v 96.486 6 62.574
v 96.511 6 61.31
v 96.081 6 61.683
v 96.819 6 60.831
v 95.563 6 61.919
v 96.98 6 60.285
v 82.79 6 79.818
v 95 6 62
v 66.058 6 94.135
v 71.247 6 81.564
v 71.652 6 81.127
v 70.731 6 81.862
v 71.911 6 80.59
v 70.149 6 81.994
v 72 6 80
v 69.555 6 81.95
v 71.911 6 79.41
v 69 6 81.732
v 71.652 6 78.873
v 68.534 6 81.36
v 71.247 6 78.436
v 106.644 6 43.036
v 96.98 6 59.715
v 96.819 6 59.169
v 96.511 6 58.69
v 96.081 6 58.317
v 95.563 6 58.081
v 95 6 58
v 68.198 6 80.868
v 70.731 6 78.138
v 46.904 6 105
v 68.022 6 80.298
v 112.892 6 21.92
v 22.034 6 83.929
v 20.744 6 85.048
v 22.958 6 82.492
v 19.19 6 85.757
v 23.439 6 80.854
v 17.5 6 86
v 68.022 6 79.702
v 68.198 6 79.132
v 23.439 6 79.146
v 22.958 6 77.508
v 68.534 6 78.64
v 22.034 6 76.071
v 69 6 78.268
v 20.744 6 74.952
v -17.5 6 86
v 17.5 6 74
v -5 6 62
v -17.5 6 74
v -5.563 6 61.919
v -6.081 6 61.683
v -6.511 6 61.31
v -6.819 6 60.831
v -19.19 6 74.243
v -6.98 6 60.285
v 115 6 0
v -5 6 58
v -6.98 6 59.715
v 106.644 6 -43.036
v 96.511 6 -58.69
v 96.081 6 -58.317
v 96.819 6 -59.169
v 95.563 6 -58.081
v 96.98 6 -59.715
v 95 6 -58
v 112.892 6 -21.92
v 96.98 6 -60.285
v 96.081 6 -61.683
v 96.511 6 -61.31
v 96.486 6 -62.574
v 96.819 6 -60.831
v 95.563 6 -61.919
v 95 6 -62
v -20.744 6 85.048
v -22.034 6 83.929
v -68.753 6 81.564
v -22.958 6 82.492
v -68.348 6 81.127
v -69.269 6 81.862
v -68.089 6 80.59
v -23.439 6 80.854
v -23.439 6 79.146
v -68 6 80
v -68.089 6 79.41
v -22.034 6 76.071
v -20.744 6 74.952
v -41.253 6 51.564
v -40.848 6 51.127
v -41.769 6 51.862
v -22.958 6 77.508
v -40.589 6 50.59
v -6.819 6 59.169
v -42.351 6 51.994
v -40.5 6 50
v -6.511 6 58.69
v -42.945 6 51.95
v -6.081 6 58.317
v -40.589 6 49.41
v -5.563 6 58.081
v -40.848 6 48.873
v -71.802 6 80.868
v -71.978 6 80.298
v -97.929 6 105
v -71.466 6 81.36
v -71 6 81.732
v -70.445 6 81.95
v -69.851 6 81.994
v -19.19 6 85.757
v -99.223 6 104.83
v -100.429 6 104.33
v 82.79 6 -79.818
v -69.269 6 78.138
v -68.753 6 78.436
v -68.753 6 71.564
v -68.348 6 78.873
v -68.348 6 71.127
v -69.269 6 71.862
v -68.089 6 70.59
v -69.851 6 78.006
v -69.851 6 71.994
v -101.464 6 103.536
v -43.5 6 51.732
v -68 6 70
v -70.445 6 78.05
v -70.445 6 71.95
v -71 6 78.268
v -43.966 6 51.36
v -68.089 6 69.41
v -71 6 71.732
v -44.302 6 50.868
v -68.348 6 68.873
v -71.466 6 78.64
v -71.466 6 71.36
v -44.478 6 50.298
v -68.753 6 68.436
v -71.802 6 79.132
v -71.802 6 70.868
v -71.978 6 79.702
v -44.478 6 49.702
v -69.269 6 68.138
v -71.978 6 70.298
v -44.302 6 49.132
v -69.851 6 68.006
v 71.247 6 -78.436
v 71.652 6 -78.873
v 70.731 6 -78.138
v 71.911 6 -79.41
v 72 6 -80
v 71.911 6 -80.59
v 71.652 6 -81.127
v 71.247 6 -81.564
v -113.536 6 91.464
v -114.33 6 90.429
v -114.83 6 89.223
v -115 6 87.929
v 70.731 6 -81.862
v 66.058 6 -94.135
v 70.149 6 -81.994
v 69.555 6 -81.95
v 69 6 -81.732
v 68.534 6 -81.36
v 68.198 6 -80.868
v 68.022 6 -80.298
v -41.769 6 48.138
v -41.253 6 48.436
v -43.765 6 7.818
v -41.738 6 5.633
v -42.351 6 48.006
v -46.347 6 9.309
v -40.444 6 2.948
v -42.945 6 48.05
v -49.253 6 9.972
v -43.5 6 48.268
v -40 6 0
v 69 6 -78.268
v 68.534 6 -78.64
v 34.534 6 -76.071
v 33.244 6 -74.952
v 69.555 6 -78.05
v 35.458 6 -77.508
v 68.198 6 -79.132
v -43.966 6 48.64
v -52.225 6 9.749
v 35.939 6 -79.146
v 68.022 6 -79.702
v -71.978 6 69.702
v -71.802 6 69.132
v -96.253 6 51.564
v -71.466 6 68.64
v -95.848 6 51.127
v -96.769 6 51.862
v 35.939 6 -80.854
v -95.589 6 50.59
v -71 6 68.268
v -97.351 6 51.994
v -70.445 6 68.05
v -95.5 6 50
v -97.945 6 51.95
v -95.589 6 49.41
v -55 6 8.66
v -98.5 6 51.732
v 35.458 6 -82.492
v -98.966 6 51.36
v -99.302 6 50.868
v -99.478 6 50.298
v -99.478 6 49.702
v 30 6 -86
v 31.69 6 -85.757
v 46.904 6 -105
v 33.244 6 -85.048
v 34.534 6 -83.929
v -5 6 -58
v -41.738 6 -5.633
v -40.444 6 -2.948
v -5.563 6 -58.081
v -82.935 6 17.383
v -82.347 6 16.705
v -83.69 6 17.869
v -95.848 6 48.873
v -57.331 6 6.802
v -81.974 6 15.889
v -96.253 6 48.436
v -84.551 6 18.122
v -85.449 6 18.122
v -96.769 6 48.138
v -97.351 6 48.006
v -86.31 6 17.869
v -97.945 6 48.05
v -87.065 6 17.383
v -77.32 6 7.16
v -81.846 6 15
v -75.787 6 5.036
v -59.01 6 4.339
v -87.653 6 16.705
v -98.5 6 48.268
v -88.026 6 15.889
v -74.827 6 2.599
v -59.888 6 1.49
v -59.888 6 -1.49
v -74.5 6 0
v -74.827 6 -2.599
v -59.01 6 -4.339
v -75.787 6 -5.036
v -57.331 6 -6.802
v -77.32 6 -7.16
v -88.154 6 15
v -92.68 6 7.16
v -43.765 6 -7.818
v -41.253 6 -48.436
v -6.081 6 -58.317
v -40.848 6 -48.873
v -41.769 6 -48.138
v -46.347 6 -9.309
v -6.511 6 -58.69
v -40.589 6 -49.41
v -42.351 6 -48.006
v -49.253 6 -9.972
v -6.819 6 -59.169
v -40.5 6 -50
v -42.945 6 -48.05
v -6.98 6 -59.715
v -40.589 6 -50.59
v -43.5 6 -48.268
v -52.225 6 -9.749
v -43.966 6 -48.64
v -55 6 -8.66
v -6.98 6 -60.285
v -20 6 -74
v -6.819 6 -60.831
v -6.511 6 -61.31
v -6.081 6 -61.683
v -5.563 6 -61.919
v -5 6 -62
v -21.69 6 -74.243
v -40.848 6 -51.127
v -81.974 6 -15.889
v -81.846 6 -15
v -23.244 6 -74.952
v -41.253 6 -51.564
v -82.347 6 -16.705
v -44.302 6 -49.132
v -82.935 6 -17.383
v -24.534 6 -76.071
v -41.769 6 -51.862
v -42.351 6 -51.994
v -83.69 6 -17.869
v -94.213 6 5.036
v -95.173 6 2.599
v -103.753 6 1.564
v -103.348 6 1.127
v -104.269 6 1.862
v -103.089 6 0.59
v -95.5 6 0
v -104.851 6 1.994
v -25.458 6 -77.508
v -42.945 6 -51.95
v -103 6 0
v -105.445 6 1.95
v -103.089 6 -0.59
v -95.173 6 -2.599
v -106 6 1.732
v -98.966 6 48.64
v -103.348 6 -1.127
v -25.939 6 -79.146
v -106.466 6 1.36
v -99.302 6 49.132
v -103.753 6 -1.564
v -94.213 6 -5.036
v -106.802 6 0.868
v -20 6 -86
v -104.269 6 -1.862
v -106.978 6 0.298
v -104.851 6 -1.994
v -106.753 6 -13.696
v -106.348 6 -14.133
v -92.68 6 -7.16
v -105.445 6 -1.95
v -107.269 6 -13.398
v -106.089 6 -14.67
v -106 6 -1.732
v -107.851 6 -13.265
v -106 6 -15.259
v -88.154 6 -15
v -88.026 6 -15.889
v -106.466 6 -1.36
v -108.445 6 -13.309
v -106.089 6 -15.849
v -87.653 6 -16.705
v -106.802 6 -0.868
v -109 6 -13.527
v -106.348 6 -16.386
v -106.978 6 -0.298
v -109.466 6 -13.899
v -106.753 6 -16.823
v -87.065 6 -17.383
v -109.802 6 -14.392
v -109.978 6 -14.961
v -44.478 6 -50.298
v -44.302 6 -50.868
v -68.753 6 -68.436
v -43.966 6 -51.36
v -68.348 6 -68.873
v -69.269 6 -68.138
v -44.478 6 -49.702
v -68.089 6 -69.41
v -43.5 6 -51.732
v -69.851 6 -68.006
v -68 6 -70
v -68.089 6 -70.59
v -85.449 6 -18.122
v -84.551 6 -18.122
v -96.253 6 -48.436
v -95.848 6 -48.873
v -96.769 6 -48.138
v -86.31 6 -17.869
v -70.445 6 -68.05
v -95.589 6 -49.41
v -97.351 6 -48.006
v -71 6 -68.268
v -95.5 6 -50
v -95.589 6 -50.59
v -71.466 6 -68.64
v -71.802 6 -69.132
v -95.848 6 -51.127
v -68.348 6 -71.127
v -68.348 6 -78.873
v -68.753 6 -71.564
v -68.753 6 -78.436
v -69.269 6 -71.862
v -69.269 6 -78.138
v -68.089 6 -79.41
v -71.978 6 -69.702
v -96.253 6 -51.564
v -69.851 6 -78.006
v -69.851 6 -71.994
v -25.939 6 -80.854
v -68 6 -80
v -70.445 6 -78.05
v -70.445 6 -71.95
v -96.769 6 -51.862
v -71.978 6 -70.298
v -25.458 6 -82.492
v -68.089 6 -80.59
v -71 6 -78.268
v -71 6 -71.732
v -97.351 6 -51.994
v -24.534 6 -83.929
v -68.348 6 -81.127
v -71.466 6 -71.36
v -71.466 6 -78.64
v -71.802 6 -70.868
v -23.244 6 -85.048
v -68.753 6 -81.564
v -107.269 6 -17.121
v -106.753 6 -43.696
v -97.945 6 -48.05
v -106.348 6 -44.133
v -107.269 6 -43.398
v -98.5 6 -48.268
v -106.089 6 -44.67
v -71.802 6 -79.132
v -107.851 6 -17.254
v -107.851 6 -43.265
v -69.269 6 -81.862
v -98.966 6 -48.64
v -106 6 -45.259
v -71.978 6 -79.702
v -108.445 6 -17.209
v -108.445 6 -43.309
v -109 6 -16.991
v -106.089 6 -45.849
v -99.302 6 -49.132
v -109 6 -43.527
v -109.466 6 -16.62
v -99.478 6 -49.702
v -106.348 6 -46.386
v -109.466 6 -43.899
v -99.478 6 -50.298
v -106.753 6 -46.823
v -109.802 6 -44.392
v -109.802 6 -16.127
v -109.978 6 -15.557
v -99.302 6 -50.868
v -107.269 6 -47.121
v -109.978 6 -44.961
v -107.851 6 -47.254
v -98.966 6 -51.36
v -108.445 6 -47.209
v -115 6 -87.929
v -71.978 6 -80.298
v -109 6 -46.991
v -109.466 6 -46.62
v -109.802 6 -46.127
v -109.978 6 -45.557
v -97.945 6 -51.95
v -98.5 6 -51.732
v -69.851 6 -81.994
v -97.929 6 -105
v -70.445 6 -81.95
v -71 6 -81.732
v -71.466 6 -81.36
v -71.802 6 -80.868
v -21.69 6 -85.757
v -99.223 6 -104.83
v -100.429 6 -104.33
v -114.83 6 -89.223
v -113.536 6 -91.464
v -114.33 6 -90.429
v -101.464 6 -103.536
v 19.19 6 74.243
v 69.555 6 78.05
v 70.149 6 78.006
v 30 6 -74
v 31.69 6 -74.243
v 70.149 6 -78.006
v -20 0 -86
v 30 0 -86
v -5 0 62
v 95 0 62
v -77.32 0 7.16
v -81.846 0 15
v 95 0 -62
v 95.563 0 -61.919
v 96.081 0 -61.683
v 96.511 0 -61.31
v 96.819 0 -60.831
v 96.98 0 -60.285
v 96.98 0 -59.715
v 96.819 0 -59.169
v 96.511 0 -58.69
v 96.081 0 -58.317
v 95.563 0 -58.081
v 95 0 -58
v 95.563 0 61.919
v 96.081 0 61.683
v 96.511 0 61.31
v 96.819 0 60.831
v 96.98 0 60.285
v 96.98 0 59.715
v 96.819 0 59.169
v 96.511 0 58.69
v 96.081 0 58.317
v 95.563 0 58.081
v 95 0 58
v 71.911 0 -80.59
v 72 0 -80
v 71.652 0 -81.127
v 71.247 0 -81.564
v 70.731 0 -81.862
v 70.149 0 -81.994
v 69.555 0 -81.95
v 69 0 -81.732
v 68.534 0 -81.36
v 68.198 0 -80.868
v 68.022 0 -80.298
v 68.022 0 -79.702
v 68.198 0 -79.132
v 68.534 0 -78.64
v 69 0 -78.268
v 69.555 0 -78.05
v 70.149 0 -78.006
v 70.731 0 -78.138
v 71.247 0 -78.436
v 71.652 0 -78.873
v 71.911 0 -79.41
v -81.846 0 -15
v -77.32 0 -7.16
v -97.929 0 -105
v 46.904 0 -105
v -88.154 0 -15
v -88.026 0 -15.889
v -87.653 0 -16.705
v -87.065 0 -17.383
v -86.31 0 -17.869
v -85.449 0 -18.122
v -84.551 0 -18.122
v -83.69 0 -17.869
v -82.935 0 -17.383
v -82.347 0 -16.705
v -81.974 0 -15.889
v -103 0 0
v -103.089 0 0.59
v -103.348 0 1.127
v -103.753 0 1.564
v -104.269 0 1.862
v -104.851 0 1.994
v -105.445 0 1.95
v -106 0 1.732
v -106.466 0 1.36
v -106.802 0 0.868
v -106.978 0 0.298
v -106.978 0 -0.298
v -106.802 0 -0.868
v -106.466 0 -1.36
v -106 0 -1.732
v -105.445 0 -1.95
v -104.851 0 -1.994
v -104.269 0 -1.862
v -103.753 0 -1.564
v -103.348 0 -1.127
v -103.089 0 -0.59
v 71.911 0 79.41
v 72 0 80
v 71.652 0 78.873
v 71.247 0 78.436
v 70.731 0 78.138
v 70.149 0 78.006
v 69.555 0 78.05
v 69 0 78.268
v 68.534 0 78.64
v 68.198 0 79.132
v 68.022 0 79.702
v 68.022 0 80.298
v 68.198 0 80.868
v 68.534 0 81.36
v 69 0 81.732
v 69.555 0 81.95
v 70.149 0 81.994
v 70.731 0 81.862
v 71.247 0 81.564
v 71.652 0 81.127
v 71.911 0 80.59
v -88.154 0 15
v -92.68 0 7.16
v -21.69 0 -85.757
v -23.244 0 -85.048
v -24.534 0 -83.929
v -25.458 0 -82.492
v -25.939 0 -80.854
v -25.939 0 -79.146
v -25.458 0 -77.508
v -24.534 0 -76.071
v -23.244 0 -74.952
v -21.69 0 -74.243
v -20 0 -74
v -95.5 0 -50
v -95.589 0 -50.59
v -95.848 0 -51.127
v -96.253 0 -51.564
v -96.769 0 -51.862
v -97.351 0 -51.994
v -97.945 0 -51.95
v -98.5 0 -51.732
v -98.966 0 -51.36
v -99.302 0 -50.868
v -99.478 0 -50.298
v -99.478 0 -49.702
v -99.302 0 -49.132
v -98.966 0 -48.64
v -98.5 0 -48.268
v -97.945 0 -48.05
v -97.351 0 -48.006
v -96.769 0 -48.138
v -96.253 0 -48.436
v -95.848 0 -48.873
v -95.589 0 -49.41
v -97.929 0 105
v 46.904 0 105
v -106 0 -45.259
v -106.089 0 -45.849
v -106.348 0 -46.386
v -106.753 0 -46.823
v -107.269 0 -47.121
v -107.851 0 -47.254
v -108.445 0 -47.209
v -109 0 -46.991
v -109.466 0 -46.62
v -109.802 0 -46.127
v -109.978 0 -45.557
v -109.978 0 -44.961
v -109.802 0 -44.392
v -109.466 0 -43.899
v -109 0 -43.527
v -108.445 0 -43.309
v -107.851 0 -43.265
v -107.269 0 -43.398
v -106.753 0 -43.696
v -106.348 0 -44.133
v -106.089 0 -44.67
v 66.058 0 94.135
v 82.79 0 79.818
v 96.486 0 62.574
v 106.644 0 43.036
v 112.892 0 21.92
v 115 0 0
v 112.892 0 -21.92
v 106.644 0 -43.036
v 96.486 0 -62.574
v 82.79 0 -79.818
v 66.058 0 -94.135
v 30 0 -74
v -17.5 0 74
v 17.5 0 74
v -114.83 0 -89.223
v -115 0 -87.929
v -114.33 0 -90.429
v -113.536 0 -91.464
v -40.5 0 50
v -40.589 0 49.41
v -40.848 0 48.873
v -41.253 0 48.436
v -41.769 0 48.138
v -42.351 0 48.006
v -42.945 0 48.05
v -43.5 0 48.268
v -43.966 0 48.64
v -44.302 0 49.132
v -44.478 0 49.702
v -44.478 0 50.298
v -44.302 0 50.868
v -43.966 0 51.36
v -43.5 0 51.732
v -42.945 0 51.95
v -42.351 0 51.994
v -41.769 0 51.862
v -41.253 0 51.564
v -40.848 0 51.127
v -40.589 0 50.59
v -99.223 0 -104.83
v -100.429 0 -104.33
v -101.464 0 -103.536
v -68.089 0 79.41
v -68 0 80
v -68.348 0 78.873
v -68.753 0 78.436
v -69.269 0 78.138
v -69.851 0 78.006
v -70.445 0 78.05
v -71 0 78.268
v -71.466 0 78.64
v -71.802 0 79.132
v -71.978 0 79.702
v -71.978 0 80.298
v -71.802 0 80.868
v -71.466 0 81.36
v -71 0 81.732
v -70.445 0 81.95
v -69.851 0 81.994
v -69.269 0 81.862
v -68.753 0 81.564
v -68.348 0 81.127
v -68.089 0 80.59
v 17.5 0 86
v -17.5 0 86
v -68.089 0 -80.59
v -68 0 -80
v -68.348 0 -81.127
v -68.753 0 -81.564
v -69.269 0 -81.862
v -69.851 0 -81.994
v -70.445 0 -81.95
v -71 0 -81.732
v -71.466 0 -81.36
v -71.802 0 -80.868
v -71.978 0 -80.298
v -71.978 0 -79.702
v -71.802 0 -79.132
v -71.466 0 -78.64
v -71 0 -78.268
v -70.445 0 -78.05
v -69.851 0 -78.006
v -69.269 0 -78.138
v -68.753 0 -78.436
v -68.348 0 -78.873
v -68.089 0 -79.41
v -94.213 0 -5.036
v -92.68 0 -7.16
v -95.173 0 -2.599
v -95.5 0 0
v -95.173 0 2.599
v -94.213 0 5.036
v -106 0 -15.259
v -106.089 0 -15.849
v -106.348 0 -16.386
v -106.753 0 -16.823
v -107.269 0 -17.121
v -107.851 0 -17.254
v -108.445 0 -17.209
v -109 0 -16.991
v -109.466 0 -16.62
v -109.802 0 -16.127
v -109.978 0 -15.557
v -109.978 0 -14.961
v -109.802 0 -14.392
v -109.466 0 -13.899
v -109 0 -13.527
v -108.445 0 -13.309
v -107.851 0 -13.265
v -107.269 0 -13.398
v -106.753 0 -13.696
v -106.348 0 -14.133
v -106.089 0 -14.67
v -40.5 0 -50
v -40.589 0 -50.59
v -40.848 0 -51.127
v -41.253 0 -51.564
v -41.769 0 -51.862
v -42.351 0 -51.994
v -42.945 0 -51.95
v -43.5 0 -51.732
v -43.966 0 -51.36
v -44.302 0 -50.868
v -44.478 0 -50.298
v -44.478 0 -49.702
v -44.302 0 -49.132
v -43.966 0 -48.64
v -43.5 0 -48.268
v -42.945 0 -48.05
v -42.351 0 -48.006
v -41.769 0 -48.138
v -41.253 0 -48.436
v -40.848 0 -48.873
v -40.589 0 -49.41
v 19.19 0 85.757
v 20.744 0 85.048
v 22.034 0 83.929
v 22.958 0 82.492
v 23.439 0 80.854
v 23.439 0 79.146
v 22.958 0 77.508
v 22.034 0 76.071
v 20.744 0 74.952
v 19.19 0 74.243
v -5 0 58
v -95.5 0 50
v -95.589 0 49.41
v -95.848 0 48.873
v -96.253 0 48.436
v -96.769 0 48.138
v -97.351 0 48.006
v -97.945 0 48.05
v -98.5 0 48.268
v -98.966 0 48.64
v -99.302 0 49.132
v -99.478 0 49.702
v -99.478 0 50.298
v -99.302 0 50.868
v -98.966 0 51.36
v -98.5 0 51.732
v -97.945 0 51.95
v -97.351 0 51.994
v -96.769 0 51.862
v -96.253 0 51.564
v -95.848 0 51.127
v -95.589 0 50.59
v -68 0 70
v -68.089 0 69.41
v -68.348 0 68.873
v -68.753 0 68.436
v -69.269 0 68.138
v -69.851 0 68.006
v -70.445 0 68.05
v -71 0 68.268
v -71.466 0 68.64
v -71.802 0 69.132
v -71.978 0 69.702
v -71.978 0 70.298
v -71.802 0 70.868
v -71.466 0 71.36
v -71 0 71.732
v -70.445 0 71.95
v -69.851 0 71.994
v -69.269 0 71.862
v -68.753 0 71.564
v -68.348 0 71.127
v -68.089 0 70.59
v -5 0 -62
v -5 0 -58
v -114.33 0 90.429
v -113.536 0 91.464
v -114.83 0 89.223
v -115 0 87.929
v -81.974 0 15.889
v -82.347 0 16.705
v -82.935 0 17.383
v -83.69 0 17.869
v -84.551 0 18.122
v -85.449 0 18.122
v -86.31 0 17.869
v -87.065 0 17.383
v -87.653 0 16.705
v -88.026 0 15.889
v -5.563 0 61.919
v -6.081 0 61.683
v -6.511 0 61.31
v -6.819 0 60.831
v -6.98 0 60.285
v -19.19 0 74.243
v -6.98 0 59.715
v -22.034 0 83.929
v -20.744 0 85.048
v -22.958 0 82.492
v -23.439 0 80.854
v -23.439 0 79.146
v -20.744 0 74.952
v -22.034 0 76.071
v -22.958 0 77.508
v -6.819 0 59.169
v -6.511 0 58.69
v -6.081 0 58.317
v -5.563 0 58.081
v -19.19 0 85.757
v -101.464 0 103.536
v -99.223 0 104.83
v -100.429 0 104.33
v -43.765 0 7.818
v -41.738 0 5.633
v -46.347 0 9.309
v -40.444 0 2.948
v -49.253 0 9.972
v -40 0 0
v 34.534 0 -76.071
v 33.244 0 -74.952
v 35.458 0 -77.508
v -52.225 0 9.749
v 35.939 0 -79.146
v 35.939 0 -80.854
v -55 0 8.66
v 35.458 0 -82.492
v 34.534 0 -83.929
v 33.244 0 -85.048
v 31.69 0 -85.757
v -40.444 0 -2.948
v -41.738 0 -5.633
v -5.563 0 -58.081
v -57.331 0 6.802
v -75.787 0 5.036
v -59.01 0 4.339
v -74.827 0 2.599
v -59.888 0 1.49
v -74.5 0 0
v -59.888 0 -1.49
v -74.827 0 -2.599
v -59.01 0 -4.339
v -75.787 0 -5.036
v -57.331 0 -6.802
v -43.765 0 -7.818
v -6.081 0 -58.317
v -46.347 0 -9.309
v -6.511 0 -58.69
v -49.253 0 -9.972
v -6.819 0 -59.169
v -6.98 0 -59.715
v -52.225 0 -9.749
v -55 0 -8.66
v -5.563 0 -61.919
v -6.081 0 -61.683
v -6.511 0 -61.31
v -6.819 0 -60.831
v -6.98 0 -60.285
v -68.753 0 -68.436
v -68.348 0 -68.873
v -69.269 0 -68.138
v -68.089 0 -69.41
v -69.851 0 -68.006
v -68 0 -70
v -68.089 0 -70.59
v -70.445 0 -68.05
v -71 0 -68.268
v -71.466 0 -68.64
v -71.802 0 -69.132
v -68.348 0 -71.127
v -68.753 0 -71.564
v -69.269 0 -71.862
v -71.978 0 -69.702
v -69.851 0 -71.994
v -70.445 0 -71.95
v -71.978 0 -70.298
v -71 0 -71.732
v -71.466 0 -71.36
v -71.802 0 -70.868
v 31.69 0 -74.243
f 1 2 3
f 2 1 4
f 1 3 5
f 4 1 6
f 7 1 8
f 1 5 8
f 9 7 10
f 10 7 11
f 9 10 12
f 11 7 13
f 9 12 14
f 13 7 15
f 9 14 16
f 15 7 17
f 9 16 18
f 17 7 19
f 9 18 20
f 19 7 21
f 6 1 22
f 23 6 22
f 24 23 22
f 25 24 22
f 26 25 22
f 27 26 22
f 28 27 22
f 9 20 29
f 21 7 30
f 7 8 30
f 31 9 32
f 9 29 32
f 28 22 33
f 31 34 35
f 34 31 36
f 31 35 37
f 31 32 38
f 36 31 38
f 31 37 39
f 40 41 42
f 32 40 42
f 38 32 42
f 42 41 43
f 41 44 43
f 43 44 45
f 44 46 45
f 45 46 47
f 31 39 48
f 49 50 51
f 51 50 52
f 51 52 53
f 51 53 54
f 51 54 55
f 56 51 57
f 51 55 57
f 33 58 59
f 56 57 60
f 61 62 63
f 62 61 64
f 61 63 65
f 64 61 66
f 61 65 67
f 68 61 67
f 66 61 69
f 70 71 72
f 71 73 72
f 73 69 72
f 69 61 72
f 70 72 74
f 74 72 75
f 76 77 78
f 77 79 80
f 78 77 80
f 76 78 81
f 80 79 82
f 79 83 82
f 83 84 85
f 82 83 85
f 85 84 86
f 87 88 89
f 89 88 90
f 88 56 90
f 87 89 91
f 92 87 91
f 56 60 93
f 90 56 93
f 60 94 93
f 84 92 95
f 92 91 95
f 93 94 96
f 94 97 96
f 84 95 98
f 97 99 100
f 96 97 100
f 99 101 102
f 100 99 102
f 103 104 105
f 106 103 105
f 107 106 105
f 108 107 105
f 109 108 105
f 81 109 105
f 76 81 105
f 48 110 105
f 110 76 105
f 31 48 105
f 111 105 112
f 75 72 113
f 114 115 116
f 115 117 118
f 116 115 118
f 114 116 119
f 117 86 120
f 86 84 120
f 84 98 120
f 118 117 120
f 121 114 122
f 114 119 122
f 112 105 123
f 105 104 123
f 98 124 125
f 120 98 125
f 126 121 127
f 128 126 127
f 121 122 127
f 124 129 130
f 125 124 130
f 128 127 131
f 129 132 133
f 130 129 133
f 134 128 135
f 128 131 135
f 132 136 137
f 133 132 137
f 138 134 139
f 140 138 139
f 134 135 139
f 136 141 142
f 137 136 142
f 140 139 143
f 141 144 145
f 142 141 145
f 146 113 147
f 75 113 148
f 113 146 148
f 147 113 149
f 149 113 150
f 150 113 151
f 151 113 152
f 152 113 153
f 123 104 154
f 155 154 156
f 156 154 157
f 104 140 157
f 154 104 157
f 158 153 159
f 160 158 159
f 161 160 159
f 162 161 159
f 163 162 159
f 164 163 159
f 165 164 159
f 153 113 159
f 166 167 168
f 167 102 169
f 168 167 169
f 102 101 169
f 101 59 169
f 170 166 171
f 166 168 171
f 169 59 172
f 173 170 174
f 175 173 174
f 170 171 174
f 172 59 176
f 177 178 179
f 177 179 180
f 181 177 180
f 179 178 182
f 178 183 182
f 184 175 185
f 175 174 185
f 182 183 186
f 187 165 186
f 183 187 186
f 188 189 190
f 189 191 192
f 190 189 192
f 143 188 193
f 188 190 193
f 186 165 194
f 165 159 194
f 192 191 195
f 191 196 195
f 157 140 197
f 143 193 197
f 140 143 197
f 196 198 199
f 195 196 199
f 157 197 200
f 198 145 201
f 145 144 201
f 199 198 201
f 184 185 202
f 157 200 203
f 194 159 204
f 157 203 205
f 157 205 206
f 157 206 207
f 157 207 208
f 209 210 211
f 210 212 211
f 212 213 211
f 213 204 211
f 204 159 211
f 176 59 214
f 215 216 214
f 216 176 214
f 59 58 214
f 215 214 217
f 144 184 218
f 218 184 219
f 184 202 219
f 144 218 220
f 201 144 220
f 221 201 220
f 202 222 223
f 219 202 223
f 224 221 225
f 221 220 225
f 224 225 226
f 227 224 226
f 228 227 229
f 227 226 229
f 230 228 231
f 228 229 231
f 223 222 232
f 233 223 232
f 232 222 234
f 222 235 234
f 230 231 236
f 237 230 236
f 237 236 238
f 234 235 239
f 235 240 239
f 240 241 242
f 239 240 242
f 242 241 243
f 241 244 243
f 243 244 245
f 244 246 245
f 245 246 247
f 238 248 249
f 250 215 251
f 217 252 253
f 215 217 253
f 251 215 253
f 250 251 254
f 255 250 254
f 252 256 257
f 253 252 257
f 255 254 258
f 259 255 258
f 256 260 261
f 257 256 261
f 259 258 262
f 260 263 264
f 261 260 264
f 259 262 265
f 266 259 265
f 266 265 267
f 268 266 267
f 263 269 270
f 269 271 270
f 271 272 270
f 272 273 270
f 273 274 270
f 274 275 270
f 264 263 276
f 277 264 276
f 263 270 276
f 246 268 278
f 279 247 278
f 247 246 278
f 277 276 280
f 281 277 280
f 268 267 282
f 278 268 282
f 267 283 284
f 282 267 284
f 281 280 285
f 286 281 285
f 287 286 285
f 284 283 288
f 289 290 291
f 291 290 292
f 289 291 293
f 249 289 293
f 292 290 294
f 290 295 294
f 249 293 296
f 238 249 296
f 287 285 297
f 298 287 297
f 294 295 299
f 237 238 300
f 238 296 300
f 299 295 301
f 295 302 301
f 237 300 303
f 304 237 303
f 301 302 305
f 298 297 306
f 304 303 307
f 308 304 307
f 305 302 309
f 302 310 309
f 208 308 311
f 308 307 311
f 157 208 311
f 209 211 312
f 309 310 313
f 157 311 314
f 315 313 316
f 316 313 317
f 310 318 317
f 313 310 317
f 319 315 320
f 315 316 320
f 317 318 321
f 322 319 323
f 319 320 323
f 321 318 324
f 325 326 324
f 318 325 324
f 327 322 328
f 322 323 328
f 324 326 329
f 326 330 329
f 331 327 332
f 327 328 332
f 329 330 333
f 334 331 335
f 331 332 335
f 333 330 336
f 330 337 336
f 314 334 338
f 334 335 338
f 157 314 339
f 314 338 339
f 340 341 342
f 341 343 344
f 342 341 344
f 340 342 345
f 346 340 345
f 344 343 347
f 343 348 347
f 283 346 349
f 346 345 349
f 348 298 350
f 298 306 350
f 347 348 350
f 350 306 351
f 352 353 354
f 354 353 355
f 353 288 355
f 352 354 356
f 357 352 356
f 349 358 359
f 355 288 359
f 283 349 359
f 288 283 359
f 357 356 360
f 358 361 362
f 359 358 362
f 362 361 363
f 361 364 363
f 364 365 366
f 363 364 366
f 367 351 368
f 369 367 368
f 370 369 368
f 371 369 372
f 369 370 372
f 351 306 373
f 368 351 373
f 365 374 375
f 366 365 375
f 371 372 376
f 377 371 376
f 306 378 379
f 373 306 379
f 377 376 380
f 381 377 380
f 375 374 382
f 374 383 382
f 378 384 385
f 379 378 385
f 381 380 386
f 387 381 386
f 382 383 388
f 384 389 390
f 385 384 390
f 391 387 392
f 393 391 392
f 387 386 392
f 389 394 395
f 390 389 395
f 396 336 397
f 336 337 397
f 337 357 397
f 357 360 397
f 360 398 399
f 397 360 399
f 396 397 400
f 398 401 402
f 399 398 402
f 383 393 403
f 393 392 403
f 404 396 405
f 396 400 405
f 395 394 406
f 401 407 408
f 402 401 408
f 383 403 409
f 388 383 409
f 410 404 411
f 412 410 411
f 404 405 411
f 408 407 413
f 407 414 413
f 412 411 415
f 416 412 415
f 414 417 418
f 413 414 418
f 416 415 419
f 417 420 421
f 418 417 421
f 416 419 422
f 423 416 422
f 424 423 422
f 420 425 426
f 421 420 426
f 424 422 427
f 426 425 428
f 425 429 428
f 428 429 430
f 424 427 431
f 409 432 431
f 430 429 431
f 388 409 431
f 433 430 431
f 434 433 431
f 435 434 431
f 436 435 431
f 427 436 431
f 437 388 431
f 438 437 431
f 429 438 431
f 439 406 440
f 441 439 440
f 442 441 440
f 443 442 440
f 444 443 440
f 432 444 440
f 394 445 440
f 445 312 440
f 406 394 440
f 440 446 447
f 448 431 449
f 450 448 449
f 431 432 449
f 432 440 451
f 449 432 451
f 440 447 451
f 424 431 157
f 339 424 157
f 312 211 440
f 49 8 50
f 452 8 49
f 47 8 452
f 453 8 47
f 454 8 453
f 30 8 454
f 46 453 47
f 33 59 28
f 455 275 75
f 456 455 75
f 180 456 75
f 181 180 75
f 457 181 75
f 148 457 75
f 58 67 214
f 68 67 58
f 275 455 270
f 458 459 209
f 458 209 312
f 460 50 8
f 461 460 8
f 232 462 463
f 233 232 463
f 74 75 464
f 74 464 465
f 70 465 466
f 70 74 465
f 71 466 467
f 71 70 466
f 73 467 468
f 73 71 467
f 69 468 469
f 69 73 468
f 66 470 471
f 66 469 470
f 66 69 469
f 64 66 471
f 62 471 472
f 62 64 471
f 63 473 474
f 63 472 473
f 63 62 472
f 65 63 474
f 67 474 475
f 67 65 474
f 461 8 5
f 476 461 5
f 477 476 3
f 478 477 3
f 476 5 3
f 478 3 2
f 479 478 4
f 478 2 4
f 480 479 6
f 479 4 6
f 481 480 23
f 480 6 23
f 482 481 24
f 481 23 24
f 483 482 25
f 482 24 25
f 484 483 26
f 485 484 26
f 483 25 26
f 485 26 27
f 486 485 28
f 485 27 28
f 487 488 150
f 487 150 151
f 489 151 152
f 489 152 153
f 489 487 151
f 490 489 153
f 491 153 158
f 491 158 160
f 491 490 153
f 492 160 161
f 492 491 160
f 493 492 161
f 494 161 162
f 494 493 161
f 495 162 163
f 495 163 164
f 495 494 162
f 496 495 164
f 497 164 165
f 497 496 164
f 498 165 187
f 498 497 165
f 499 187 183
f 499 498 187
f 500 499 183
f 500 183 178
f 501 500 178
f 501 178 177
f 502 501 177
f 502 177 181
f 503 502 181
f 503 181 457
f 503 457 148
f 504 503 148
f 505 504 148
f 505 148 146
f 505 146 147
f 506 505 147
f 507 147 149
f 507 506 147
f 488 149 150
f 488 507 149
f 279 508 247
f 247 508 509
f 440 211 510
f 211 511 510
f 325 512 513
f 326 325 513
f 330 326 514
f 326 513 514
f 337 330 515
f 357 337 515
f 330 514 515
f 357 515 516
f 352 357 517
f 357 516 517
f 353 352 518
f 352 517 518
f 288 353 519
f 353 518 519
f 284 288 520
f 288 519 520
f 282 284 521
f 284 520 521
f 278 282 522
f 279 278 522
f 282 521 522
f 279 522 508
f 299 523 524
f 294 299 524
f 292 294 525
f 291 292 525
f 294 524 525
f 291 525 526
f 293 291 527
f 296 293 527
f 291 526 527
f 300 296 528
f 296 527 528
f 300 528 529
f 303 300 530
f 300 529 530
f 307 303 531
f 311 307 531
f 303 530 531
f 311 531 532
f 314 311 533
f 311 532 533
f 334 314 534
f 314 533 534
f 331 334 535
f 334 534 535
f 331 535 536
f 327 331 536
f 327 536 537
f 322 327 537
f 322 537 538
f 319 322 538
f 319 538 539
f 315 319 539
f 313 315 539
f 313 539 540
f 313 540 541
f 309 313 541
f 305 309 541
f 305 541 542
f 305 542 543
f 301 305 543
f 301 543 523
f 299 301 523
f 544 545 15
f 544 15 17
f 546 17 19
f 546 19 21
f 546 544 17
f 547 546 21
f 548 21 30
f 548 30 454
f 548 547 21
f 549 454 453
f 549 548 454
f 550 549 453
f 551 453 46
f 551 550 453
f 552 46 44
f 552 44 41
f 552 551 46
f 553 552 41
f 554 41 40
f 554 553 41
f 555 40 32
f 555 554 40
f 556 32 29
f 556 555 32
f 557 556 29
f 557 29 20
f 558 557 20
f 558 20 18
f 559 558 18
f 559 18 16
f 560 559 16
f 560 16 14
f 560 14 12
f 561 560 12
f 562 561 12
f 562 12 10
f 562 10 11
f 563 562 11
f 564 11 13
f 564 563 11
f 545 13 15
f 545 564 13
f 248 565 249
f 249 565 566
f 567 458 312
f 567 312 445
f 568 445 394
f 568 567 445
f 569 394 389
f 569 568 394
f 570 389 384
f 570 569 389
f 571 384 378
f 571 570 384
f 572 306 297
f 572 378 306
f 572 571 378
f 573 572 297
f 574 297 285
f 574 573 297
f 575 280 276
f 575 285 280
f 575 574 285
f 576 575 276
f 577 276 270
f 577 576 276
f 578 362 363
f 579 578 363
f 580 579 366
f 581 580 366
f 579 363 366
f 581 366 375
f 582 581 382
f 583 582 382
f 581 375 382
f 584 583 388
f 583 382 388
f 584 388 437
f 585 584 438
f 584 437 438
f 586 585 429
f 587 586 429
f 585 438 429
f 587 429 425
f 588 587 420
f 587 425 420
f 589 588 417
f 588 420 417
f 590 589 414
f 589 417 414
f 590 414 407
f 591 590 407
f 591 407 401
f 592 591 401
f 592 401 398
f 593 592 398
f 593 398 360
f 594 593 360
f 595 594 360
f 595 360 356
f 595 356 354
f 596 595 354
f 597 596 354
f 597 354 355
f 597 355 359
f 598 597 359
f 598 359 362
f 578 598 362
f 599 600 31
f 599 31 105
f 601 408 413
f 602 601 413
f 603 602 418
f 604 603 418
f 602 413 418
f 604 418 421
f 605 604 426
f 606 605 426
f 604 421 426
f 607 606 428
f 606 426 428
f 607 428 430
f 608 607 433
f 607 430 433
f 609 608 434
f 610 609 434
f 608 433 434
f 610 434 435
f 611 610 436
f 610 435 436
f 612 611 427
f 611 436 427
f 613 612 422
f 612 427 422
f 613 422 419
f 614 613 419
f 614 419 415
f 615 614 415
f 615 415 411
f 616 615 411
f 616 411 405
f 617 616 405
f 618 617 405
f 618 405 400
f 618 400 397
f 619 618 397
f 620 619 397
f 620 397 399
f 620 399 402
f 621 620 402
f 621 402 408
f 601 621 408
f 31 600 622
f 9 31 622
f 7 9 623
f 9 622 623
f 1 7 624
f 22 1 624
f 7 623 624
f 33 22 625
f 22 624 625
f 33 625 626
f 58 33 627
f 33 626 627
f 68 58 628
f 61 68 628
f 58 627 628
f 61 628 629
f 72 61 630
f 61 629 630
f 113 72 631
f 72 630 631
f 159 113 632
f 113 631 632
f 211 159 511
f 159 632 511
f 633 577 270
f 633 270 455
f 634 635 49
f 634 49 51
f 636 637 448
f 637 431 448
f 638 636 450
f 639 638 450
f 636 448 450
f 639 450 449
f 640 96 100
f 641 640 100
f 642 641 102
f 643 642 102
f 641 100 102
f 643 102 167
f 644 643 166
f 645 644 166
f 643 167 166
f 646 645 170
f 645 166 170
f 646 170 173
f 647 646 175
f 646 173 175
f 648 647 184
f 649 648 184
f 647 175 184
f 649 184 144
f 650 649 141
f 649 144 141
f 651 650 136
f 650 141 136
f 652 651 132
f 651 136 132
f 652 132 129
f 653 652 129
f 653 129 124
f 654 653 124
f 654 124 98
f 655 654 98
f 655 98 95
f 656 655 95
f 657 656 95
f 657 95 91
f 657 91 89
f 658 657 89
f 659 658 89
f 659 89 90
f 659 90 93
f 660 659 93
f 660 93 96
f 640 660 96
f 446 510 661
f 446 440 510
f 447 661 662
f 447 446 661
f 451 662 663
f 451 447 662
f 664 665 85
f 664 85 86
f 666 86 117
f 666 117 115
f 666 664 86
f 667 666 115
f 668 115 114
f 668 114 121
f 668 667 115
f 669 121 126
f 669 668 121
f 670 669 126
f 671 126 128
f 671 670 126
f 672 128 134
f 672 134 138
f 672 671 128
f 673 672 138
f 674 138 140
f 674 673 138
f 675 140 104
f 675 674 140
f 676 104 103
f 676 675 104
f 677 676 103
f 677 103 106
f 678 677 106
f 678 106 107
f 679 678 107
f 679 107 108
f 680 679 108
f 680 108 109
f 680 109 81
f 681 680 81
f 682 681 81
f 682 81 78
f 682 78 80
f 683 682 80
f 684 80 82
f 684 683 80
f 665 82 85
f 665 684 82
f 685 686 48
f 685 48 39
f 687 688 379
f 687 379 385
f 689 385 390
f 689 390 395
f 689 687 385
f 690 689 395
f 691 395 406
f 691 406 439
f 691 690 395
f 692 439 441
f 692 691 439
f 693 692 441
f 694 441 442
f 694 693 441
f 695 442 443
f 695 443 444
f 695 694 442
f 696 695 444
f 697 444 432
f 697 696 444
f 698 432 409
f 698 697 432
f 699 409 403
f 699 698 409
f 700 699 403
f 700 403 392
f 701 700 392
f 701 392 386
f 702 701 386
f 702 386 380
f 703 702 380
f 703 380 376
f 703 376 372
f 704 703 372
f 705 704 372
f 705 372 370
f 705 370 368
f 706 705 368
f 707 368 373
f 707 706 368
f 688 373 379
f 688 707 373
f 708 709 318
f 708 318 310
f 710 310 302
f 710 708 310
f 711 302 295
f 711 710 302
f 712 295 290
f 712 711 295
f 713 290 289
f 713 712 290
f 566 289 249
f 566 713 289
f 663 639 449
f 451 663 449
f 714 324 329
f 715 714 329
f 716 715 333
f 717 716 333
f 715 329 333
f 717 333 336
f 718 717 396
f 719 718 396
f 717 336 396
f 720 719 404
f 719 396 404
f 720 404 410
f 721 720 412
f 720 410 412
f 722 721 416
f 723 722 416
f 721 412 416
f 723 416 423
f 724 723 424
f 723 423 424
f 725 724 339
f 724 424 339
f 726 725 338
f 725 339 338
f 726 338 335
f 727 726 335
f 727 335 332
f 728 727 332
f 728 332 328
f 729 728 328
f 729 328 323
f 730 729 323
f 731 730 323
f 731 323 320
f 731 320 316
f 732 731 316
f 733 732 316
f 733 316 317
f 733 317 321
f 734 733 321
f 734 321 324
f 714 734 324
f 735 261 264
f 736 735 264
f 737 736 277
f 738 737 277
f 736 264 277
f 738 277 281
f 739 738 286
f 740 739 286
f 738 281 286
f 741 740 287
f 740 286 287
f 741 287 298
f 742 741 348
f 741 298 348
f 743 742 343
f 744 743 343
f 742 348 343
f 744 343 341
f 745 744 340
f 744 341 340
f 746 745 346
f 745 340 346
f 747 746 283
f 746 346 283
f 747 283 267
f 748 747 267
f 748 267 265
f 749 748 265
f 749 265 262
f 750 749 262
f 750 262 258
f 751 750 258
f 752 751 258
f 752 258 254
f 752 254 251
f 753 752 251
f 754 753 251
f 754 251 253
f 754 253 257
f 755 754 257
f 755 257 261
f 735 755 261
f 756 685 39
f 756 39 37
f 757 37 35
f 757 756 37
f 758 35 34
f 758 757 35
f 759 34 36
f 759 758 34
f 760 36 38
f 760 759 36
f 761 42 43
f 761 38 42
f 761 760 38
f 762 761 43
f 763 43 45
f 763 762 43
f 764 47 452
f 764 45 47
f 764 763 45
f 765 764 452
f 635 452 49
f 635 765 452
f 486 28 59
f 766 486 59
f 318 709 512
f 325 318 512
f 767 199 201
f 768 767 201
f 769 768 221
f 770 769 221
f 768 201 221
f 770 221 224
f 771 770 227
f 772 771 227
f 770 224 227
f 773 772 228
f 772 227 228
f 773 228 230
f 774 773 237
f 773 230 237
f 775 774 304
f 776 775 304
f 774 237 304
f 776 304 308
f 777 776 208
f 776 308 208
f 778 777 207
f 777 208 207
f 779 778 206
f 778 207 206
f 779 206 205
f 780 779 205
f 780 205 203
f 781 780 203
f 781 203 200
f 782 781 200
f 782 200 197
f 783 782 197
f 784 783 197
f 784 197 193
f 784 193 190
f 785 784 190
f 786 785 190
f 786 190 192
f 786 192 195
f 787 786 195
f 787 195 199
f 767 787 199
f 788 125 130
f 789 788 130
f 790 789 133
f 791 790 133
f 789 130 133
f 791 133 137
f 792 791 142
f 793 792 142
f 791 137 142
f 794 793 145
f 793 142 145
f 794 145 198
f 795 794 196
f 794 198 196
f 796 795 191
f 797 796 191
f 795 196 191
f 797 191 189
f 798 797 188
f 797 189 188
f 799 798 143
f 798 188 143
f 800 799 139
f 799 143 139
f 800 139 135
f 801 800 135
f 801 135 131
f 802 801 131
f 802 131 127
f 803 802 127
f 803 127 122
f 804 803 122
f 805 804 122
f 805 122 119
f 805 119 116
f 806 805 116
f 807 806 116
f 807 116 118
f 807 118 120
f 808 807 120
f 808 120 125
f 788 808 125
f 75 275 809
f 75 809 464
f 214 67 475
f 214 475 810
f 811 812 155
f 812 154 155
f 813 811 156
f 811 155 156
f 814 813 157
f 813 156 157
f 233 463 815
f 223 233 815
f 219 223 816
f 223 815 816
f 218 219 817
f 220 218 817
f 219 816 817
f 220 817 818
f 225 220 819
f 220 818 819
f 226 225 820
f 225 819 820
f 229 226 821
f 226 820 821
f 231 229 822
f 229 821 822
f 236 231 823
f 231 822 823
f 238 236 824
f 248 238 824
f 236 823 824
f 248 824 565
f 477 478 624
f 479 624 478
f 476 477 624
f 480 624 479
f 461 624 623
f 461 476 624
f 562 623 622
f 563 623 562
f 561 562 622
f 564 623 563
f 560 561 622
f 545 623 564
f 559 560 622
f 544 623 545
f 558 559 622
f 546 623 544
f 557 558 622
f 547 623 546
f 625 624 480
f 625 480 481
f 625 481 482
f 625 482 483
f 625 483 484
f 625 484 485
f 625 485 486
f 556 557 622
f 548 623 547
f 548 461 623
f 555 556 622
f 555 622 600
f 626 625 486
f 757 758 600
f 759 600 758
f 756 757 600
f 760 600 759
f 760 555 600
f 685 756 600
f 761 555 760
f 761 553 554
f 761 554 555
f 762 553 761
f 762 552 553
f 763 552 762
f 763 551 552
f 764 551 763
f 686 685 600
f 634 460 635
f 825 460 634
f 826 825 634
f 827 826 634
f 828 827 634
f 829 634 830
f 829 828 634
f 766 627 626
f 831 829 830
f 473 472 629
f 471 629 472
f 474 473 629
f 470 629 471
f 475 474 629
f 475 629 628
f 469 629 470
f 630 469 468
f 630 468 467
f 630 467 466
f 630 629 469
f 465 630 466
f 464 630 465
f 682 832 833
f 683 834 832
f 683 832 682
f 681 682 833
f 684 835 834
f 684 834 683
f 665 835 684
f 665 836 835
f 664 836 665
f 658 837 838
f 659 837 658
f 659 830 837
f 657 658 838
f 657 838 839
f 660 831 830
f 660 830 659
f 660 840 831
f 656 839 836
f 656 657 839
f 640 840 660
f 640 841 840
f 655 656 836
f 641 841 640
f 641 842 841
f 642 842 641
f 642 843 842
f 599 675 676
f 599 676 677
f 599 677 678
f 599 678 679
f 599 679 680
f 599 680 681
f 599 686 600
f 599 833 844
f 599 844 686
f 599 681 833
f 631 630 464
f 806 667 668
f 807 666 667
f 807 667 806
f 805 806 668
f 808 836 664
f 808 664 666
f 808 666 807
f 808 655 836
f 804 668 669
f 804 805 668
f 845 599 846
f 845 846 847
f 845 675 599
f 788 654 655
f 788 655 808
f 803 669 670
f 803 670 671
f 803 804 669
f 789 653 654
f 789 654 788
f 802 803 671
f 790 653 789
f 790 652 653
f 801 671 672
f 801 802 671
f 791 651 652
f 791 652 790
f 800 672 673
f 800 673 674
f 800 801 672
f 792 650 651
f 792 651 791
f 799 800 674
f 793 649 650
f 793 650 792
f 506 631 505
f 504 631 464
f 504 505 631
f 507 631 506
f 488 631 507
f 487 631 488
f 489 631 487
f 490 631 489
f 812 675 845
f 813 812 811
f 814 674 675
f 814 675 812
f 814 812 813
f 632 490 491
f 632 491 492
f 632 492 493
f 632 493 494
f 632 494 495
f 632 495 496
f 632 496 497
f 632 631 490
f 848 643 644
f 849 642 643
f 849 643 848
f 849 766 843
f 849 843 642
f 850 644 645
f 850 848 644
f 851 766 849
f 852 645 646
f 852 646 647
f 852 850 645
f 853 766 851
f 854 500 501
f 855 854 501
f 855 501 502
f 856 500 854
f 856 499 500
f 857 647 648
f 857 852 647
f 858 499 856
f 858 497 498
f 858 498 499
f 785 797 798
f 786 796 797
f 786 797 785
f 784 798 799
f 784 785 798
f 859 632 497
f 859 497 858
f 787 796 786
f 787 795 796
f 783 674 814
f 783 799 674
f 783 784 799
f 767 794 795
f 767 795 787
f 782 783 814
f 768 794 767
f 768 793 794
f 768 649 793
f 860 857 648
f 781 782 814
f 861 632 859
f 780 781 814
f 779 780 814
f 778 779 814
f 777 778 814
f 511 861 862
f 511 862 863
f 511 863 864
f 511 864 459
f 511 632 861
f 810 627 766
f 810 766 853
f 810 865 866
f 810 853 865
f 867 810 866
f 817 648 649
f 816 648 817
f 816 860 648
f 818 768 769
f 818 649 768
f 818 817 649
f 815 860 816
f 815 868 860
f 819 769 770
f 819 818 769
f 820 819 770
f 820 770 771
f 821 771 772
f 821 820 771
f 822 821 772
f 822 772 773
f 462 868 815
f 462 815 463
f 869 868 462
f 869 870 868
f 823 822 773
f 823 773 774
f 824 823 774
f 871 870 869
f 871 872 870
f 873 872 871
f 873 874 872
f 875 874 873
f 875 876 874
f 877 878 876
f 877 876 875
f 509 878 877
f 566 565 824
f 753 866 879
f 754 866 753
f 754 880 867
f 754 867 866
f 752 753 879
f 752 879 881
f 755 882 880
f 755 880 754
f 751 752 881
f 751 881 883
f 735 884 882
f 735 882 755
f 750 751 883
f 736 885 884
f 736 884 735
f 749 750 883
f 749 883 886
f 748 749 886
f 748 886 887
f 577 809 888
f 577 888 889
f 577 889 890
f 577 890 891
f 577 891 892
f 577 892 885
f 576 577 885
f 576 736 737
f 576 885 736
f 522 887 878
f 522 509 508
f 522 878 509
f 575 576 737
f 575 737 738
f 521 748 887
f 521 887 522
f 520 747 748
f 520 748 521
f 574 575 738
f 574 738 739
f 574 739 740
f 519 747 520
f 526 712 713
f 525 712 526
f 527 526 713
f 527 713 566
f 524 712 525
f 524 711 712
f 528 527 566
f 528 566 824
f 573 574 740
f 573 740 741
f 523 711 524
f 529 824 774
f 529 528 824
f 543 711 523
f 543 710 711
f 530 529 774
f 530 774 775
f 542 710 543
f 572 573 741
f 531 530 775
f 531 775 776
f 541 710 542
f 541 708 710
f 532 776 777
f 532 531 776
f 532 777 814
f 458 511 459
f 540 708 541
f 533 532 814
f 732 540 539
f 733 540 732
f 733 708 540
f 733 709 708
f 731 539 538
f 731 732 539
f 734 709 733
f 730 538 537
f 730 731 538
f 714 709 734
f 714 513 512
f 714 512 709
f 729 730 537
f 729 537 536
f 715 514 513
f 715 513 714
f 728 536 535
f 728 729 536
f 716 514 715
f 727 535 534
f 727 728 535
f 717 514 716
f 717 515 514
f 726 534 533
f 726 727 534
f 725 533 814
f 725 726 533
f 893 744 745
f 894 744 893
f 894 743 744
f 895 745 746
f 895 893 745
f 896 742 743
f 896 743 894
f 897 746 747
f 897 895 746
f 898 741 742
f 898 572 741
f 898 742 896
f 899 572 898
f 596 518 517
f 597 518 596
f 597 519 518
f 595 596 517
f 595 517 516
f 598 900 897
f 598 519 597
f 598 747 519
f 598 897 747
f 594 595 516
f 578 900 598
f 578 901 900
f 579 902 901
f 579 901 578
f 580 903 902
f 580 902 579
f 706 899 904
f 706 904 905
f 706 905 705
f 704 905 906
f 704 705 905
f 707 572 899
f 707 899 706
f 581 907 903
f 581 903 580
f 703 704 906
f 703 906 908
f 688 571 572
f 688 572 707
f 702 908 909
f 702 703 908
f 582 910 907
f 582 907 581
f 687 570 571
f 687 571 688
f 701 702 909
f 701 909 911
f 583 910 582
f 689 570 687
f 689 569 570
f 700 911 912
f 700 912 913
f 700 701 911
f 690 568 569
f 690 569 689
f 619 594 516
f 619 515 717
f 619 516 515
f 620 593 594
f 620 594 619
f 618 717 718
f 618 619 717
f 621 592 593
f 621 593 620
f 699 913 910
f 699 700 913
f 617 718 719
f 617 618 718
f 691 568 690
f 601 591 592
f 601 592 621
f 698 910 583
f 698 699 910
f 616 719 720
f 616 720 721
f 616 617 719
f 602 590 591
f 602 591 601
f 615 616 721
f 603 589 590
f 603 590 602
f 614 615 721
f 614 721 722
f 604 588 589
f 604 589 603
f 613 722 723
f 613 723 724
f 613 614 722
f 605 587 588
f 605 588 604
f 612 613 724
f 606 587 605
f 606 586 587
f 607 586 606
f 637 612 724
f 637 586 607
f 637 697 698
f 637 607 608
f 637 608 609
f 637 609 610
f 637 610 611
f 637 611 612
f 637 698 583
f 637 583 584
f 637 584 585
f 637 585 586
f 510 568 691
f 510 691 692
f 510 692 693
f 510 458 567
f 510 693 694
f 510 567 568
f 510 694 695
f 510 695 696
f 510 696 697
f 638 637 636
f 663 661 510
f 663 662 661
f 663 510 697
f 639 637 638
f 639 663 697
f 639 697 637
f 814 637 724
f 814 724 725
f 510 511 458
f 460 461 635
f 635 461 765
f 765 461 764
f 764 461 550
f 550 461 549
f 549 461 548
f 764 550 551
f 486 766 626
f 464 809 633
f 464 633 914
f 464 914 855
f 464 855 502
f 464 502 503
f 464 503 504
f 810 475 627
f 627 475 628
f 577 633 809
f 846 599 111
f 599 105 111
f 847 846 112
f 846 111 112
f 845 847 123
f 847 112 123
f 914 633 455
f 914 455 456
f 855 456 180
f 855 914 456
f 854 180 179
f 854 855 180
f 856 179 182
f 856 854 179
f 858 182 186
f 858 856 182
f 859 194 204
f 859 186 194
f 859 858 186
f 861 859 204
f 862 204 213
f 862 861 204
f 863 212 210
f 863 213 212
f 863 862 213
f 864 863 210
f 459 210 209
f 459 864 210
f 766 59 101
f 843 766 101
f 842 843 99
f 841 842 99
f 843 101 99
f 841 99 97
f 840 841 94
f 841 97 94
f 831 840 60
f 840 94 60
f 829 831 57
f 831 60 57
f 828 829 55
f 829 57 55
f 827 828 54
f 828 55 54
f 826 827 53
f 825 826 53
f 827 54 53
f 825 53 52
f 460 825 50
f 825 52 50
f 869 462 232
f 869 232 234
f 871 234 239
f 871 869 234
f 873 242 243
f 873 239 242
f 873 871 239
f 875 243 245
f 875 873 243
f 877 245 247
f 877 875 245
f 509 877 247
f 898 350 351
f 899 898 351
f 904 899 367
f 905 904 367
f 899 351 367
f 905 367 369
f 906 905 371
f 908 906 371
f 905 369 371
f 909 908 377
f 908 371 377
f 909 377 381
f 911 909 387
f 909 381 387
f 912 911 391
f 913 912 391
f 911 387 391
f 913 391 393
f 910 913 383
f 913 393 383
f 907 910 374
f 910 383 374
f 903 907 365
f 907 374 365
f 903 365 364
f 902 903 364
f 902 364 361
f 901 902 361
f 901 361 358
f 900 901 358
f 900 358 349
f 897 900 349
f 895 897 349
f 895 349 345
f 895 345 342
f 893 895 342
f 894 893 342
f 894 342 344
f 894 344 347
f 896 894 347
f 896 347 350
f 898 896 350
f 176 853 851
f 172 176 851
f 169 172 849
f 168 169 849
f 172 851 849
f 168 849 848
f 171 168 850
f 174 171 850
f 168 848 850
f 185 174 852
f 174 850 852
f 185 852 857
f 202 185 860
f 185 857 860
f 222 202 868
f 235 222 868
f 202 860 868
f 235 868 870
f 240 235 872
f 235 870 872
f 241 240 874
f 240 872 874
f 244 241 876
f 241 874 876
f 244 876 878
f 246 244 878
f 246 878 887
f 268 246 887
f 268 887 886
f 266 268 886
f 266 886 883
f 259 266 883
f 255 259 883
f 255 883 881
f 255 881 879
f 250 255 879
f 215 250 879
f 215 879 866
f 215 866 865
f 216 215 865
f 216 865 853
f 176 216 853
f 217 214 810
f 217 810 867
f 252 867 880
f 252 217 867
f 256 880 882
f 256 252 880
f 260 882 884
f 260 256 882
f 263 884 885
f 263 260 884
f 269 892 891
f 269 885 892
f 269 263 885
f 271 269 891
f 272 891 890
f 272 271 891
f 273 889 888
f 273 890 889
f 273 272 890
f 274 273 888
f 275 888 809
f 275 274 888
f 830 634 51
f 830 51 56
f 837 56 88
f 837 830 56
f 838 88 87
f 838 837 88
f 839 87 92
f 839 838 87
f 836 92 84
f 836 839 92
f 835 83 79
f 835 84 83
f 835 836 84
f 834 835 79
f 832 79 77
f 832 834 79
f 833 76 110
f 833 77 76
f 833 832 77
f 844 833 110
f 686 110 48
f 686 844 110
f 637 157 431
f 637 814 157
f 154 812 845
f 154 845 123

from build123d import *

# Parameters (mm, degrees)
SKETCH1_R           = 2
SKETCH1_R_2         = 10.5
BOSS_EXTRUDE1_DEPTH = 6
SKETCH2_R           = 10
SKETCH2_R_2         = 2
CUT_EXTRUDE2_DEPTH  = 19
BOSS_EXTRUDE2_DEPTH = 6
CHAMFER1_SIZE       = 15
FILLET1_R           = 5
SKETCH4_R           = 2
CUT_EXTRUDE3_DEPTH  = 10
CUT_EXTRUDE4_DEPTH  = 10


with BuildPart() as part:
    # Sketch1 → Boss-Extrude1 (new body)
    with BuildSketch(Plane(origin=(0, 0, 0), x_dir=(1, 0, 0), z_dir=(0, 1, 0))):
        with BuildLine():
            Line((-46.904157598, -105), (46.904157598, -105))
            ThreePointArc((46.904157598, -105), (115, 0), (46.904157598, 105))
            Line((46.904157598, 105), (-46.904157598, 105))
            ThreePointArc((-46.904157598, 105), (-115, 0), (-46.904157598, -105))
        make_face()
        with Locations((-70, 80)):
            Circle(SKETCH1_R, mode=Mode.SUBTRACT)
        with Locations((70, 80)):
            Circle(SKETCH1_R, mode=Mode.SUBTRACT)
        with Locations((70, -80)):
            Circle(SKETCH1_R, mode=Mode.SUBTRACT)
        with Locations((-70, -80)):
            Circle(SKETCH1_R, mode=Mode.SUBTRACT)
        with Locations((-85, 0)):
            Circle(SKETCH1_R_2, mode=Mode.SUBTRACT)
    extrude(amount=BOSS_EXTRUDE1_DEPTH)

    # Sketch2 → Cut-Extrude2 (cut)
    with BuildSketch(Plane.XZ):
        with Locations((-50, 0)):
            Circle(SKETCH2_R)
        with Locations((-105, 0)):
            Circle(SKETCH2_R_2)
        with BuildLine():
            Line((-88.153729078, 15), (-92.680195826, 7.159929613))
            ThreePointArc((-92.680195826, 7.159929613), (-95.5, 0), (-92.680195826, -7.159929613))
            Line((-92.680195826, -7.159929613), (-88.153729078, -15))
            ThreePointArc((-88.153729078, -15), (-85, -18.153729078), (-81.846270922, -15))
            Line((-81.846270922, -15), (-77.319804174, -7.159929613))
            ThreePointArc((-77.319804174, -7.159929613), (-74.5, 0), (-77.319804174, 7.159929613))
            Line((-77.319804174, 7.159929613), (-81.846270922, 15))
            ThreePointArc((-81.846270922, 15), (-85, 18.153729078), (-88.153729078, 15))
        make_face()
        with BuildLine():
            Line((-20, -74), (30, -74))
            ThreePointArc((30, -74), (36, -80), (30, -86))
            Line((30, -86), (-20, -86))
            ThreePointArc((-20, -86), (-26, -80), (-20, -74))
        make_face()
        with BuildLine():
            Line((17.5, 74), (-17.5, 74))
            ThreePointArc((-17.5, 74), (-23.5, 80), (-17.5, 86))
            Line((-17.5, 86), (17.5, 86))
            ThreePointArc((17.5, 86), (23.5, 80), (17.5, 74))
        make_face()
    extrude(amount=-CUT_EXTRUDE2_DEPTH, mode=Mode.SUBTRACT)

    # Sketch3 → Boss-Extrude2 (add)
    with BuildSketch(Plane(origin=(0, 0, 0), x_dir=(-1, 0, 0), z_dir=(0, -1, 0))):
        with BuildLine():
            ThreePointArc((115, 0), (96.485693561, -62.574043645), (46.904157598, -105))
            Line((46.904157598, -105), (115, -105))
            Line((115, -105), (115, 0))
        make_face()
        with BuildLine():
            ThreePointArc((46.904157598, 105), (96.485693561, 62.574043645), (115, 0))
            Line((115, 0), (115, 105))
            Line((115, 105), (46.904157598, 105))
        make_face()
    extrude(amount=-BOSS_EXTRUDE2_DEPTH)

    # Chamfer1
    chamfer1_edges = [part.edges().sort_by_distance(p)[0] for p in [
        (-115, 3, 105),
        (-115, 3, -105),
    ]]
    chamfer(chamfer1_edges, length=CHAMFER1_SIZE)

    # Fillet1
    fillet1_edges = [part.edges().sort_by_distance(p)[0] for p in [
        (-115, 3, 90),
        (-115, 3, -90),
        (-100, 3, -105),
        (-100, 3, 105),
    ]]
    fillet(fillet1_edges, radius=FILLET1_R)

    # Sketch4 → Cut-Extrude3 (cut)
    with BuildSketch(Plane(origin=(0, 6, 0), x_dir=(1, 0, 0), z_dir=(0, 1, 0))):
        with Locations((-42.5, -50)):
            Circle(SKETCH4_R)
        with Locations((-97.5, -50)):
            Circle(SKETCH4_R)
        with Locations((-97.5, 50)):
            Circle(SKETCH4_R)
        with Locations((-42.5, 50)):
            Circle(SKETCH4_R)
        with Locations((-70, 70)):
            Circle(SKETCH4_R)
        with Locations((-70, -70)):
            Circle(SKETCH4_R)
        with Locations((-108, 15.259313515)):
            Circle(SKETCH4_R)
        with Locations((-108, 45.259313515)):
            Circle(SKETCH4_R)
    extrude(amount=-CUT_EXTRUDE3_DEPTH, mode=Mode.SUBTRACT)

    # Sketch5 → Cut-Extrude4 (cut)
    with BuildSketch(Plane(origin=(0, 6, 0), x_dir=(1, 0, 0), z_dir=(0, 1, 0))):
        with BuildLine():
            Line((-5, 62), (95, 62))
            ThreePointArc((95, 62), (97, 60), (95, 58))
            Line((95, 58), (-5, 58))
            ThreePointArc((-5, 58), (-7, 60), (-5, 62))
        make_face()
        with BuildLine():
            Line((-5, -62), (95, -62))
            ThreePointArc((95, -62), (97, -60), (95, -58))
            Line((95, -58), (-5, -58))
            ThreePointArc((-5, -58), (-7, -60), (-5, -62))
        make_face()
    extrude(amount=-CUT_EXTRUDE4_DEPTH, mode=Mode.SUBTRACT)


solid = part.part
